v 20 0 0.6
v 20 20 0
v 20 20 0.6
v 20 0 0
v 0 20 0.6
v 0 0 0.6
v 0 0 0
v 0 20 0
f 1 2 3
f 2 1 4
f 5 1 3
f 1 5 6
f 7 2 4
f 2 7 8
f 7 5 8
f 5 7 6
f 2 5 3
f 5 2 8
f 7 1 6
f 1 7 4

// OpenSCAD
    
difference(){
	union(){
        
        translate([0,0,0]){
           cube([20,20,0.6], center=false);
        }
 
	}
	union() {

}
}
